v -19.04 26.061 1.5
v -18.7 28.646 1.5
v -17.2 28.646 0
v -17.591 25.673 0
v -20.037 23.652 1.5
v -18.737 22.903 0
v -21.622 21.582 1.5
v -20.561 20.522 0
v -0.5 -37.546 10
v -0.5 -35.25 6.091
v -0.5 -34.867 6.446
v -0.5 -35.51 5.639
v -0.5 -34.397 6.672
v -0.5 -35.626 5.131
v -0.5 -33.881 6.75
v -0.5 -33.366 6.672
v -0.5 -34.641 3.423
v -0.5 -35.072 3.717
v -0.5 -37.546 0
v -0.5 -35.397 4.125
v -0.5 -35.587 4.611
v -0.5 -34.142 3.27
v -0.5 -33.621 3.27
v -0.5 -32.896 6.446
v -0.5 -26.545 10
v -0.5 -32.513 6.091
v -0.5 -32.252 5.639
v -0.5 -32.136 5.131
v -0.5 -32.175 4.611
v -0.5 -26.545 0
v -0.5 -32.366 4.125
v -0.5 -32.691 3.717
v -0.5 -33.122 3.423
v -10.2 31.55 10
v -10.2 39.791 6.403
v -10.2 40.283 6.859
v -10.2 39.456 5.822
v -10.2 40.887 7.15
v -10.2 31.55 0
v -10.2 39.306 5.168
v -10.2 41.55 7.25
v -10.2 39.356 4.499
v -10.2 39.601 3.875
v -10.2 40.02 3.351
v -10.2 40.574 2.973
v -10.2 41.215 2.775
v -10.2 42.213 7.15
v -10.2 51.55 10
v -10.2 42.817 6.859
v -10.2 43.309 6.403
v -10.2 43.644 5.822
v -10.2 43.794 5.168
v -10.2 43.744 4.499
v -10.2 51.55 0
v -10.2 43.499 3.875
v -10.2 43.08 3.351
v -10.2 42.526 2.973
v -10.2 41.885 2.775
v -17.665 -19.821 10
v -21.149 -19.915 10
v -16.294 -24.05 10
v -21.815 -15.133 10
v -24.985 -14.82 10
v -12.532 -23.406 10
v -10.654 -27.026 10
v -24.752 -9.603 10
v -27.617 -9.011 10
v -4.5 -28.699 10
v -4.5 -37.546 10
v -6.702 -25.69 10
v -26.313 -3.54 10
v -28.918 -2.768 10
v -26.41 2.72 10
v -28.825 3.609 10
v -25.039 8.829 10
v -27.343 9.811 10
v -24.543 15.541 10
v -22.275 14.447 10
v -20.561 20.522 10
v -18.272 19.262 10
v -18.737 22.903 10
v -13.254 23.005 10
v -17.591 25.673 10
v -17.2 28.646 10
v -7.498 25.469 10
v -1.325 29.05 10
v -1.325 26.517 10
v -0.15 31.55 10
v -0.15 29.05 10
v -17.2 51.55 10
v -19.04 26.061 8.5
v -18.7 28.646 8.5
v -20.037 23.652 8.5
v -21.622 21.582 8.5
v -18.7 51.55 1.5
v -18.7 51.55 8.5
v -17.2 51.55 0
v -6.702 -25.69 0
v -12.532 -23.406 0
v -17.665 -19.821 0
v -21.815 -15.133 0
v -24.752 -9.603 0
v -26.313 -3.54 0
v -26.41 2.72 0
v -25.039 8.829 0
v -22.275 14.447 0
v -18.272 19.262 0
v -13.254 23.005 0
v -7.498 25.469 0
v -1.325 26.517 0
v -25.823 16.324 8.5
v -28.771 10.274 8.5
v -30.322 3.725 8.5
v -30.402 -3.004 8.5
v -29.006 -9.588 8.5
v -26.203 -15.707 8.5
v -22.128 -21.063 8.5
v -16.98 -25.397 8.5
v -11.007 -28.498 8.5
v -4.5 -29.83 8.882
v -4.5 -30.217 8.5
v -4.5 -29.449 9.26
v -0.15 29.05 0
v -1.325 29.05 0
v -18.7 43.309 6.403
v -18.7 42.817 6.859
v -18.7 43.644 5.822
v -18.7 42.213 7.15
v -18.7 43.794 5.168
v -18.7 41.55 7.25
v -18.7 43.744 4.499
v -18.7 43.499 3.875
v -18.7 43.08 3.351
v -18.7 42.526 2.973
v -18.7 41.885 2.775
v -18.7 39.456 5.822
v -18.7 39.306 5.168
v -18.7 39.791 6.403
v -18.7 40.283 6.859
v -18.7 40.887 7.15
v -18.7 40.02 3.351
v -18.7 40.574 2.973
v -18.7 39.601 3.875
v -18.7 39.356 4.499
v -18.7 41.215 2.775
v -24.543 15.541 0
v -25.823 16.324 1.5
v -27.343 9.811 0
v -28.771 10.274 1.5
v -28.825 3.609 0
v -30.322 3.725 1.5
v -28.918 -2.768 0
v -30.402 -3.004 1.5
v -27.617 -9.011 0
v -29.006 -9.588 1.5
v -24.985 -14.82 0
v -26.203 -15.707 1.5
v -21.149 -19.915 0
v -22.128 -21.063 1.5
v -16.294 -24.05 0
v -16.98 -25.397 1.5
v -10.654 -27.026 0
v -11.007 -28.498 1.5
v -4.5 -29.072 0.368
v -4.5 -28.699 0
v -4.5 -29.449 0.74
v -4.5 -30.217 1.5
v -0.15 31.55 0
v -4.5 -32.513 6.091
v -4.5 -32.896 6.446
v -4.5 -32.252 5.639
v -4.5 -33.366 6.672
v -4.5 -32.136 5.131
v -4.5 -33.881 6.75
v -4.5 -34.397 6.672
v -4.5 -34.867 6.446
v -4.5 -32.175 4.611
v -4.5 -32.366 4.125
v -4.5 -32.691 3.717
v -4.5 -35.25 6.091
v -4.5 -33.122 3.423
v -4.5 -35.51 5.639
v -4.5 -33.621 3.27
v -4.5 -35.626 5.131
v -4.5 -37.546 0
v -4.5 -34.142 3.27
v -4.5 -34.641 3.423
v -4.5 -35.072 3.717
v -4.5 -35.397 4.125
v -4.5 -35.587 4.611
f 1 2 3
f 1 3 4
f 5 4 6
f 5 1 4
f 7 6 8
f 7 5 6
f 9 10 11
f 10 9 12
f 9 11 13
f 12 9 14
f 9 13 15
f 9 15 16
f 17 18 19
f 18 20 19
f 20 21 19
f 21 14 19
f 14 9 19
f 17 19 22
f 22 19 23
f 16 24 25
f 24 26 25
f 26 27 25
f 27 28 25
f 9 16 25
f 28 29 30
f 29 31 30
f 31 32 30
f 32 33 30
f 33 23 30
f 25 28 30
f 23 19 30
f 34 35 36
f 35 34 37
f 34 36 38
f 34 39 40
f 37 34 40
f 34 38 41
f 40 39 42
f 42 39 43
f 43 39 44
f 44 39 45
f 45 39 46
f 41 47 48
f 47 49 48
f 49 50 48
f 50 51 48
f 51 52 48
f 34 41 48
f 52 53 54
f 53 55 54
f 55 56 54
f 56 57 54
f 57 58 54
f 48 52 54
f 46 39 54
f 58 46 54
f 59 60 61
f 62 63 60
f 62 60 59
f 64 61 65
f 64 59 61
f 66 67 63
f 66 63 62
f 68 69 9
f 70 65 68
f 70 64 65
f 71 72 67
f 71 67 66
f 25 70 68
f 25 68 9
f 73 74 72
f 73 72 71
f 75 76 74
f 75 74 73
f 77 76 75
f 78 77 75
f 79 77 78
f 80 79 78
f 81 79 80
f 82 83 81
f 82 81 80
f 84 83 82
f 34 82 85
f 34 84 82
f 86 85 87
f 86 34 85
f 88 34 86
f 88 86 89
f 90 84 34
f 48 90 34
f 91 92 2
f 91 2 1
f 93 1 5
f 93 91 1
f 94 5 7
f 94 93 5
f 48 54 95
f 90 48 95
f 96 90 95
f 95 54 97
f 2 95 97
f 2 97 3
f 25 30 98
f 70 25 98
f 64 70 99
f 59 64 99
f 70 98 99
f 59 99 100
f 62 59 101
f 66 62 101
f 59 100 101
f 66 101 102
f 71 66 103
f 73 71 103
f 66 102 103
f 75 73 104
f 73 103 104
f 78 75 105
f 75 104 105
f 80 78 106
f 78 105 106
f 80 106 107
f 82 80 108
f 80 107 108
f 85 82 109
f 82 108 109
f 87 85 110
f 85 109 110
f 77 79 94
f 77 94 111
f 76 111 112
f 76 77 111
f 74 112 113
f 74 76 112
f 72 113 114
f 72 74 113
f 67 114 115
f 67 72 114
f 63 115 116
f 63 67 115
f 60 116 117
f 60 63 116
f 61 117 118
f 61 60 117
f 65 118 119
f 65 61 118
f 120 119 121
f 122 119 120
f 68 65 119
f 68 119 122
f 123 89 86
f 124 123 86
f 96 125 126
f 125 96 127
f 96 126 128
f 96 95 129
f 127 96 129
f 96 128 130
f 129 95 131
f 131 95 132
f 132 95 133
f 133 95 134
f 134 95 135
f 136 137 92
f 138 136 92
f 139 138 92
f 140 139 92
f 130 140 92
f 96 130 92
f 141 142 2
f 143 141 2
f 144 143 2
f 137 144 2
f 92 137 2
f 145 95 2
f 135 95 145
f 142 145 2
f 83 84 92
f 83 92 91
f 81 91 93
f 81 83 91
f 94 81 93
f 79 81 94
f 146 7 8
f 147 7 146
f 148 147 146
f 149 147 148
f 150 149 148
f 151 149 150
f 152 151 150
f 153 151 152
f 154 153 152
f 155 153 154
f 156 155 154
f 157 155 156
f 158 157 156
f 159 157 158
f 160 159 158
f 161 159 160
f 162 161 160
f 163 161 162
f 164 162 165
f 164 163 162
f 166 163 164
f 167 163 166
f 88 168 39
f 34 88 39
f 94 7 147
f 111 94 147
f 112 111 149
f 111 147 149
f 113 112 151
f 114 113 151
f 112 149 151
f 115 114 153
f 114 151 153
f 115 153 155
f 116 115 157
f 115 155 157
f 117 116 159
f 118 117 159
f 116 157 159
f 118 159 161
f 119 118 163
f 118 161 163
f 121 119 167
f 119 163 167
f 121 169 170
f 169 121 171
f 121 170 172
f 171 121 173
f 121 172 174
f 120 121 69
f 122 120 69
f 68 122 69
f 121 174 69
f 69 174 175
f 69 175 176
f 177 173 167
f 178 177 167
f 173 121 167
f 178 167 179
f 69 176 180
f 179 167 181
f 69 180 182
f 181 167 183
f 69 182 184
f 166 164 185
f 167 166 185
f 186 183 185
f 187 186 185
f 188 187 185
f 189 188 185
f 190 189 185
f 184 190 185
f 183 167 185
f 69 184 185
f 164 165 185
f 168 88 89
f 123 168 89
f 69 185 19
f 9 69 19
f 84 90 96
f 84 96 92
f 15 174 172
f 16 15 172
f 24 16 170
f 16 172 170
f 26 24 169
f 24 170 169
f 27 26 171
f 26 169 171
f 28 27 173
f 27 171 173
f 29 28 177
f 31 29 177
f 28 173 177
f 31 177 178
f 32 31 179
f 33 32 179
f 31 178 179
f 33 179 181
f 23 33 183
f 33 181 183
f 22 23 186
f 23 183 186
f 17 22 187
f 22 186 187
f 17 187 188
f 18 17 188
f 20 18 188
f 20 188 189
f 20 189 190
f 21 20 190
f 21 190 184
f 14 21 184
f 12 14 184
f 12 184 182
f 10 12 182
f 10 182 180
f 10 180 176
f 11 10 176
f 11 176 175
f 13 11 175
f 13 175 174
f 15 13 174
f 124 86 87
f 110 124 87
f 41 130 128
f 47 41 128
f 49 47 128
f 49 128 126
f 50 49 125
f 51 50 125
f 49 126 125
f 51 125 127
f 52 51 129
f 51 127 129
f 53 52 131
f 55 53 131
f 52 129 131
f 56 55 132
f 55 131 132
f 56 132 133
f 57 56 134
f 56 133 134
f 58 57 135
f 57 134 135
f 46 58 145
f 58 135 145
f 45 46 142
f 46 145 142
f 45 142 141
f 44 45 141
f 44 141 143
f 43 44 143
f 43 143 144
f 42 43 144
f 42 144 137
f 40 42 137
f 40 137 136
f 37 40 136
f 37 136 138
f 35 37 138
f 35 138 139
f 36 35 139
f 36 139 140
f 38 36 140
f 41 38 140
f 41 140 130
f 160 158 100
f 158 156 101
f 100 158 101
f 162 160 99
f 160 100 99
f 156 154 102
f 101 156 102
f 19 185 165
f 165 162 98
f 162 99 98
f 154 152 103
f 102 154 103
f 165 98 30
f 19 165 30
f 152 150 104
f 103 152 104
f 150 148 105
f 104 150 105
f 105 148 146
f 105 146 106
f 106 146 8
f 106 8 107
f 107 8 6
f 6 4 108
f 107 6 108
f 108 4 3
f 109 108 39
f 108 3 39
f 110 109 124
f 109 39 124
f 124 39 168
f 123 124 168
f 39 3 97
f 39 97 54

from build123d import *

# Parameters (mm, degrees)
AUFSATZ_LINEAR_AUSTRAGEN1_DEPTH = 10
SKIZZE2_R                       = 1.75
SCHNITT_LINEAR_AUSTRAGEN1_DEPTH = 36.05
SKIZZE4_R                       = 2.25
SCHNITT_LINEAR_AUSTRAGEN3_DEPTH = 50.25
VERRUNDUNG1_R                   = 10
SCHNITT_LINEAR_AUSTRAGEN5_DEPTH = 11
FASE1_SIZE                      = 1.5
SCHNITT_LINEAR_AUSTRAGEN6_DEPTH = 11


with BuildPart() as part:
    # Skizze1 → Aufsatz-Linear austragen1 (new body)
    with BuildSketch(Plane.XY):
        with BuildLine():
            Line((0.5, -26.545291485), (0.5, -30.545908073))
            Line((0.5, -30.545908073), (0.5, -37.545908073))
            Line((0.5, -37.545908073), (4.5, -37.545908073))
            Line((4.5, -37.545908073), (4.5, -30.216758595))
            ThreePointArc((4.5, -30.216758595), (29.558680329, -7.719256261), (18.7, 24.158073185))
            Line((18.7, 24.158073185), (18.7, 51.55))
            Line((18.7, 51.55), (10.2, 51.55))
            Line((10.2, 51.55), (10.2, 31.55))
            Line((10.2, 31.55), (-10.2, 31.55))
            Line((-10.2, 31.55), (-10.2, 51.55))
            Line((-10.2, 51.55), (-18.7, 51.55))
            Line((-18.7, 51.55), (-18.7, 24.158073185))
            ThreePointArc((-18.7, 24.158073185), (-29.558680329, -7.719256261), (-4.5, -30.216758595))
            Line((-4.5, -30.216758595), (-4.5, -37.545908073))
            Line((-4.5, -37.545908073), (-0.5, -37.545908073))
            Line((-0.5, -37.545908073), (-0.5, -30.545908073))
            Line((-0.5, -30.545908073), (-0.5, -26.545291485))
            ThreePointArc((-0.5, -26.545291485), (0, 26.55), (0.5, -26.545291485))
        make_face()
    extrude(amount=AUFSATZ_LINEAR_AUSTRAGEN1_DEPTH)

    # Skizze2 → Schnitt-Linear austragen1 (cut, through all)
    with BuildSketch(Plane.ZY.offset(4.5)):
        with Locations((5, -33.881333334)):
            Circle(SKIZZE2_R)
    extrude(amount=-SCHNITT_LINEAR_AUSTRAGEN1_DEPTH, mode=Mode.SUBTRACT)

    # Skizze4 → Schnitt-Linear austragen3 (cut, through all)
    with BuildSketch(Plane.ZY.offset(18.7)):
        with Locations((5, 41.55)):
            Circle(SKIZZE4_R)
    extrude(amount=-SCHNITT_LINEAR_AUSTRAGEN3_DEPTH, mode=Mode.SUBTRACT)

    # Verrundung1
    verrundung1_edges = [part.edges().sort_by_distance(p)[0] for p in [
        (-18.7, 24.158073185, 5),
        (18.7, 24.158073185, 5),
    ]]
    fillet(verrundung1_edges, radius=VERRUNDUNG1_R)

    # Skizze6 → Schnitt-Linear austragen5 (cut, through all)
    with BuildSketch(Plane.XY):
        Polygon((0, 0), (0, 63.91348789), (40.013946788, 63.91348789), (48.360414216, -54.819102682), (0, -54.819102682), align=None)
    extrude(amount=SCHNITT_LINEAR_AUSTRAGEN5_DEPTH, mode=Mode.SUBTRACT)

    # Fase1
    fase1_edges = [part.edges().sort_by_distance(p)[0] for p in [
        (-18.7, 40.098167422, 0),
        (-18.7, 40.098167422, 10),
        (-29.006358008, -9.588206043, 0),
        (-29.006358008, -9.588206043, 10),
        (-19.459415096, 24.823823807, 0),
        (-19.459415096, 24.823823807, 10),
    ]]
    chamfer(fase1_edges, length=FASE1_SIZE)

    # Skizze7 → Schnitt-Linear austragen6 (cut, through all)
    with BuildSketch(Plane.XY.offset(10)):
        Polygon((1.325, 29.05), (0, 29.05), (0, 31.55), (-0.15, 31.55), (-0.15, 29.05), (-1.325, 29.05), (-1.325, 25.137104209), (1.325, 25.137104209), align=None)
    extrude(amount=-SCHNITT_LINEAR_AUSTRAGEN6_DEPTH, mode=Mode.SUBTRACT)


solid = part.part
